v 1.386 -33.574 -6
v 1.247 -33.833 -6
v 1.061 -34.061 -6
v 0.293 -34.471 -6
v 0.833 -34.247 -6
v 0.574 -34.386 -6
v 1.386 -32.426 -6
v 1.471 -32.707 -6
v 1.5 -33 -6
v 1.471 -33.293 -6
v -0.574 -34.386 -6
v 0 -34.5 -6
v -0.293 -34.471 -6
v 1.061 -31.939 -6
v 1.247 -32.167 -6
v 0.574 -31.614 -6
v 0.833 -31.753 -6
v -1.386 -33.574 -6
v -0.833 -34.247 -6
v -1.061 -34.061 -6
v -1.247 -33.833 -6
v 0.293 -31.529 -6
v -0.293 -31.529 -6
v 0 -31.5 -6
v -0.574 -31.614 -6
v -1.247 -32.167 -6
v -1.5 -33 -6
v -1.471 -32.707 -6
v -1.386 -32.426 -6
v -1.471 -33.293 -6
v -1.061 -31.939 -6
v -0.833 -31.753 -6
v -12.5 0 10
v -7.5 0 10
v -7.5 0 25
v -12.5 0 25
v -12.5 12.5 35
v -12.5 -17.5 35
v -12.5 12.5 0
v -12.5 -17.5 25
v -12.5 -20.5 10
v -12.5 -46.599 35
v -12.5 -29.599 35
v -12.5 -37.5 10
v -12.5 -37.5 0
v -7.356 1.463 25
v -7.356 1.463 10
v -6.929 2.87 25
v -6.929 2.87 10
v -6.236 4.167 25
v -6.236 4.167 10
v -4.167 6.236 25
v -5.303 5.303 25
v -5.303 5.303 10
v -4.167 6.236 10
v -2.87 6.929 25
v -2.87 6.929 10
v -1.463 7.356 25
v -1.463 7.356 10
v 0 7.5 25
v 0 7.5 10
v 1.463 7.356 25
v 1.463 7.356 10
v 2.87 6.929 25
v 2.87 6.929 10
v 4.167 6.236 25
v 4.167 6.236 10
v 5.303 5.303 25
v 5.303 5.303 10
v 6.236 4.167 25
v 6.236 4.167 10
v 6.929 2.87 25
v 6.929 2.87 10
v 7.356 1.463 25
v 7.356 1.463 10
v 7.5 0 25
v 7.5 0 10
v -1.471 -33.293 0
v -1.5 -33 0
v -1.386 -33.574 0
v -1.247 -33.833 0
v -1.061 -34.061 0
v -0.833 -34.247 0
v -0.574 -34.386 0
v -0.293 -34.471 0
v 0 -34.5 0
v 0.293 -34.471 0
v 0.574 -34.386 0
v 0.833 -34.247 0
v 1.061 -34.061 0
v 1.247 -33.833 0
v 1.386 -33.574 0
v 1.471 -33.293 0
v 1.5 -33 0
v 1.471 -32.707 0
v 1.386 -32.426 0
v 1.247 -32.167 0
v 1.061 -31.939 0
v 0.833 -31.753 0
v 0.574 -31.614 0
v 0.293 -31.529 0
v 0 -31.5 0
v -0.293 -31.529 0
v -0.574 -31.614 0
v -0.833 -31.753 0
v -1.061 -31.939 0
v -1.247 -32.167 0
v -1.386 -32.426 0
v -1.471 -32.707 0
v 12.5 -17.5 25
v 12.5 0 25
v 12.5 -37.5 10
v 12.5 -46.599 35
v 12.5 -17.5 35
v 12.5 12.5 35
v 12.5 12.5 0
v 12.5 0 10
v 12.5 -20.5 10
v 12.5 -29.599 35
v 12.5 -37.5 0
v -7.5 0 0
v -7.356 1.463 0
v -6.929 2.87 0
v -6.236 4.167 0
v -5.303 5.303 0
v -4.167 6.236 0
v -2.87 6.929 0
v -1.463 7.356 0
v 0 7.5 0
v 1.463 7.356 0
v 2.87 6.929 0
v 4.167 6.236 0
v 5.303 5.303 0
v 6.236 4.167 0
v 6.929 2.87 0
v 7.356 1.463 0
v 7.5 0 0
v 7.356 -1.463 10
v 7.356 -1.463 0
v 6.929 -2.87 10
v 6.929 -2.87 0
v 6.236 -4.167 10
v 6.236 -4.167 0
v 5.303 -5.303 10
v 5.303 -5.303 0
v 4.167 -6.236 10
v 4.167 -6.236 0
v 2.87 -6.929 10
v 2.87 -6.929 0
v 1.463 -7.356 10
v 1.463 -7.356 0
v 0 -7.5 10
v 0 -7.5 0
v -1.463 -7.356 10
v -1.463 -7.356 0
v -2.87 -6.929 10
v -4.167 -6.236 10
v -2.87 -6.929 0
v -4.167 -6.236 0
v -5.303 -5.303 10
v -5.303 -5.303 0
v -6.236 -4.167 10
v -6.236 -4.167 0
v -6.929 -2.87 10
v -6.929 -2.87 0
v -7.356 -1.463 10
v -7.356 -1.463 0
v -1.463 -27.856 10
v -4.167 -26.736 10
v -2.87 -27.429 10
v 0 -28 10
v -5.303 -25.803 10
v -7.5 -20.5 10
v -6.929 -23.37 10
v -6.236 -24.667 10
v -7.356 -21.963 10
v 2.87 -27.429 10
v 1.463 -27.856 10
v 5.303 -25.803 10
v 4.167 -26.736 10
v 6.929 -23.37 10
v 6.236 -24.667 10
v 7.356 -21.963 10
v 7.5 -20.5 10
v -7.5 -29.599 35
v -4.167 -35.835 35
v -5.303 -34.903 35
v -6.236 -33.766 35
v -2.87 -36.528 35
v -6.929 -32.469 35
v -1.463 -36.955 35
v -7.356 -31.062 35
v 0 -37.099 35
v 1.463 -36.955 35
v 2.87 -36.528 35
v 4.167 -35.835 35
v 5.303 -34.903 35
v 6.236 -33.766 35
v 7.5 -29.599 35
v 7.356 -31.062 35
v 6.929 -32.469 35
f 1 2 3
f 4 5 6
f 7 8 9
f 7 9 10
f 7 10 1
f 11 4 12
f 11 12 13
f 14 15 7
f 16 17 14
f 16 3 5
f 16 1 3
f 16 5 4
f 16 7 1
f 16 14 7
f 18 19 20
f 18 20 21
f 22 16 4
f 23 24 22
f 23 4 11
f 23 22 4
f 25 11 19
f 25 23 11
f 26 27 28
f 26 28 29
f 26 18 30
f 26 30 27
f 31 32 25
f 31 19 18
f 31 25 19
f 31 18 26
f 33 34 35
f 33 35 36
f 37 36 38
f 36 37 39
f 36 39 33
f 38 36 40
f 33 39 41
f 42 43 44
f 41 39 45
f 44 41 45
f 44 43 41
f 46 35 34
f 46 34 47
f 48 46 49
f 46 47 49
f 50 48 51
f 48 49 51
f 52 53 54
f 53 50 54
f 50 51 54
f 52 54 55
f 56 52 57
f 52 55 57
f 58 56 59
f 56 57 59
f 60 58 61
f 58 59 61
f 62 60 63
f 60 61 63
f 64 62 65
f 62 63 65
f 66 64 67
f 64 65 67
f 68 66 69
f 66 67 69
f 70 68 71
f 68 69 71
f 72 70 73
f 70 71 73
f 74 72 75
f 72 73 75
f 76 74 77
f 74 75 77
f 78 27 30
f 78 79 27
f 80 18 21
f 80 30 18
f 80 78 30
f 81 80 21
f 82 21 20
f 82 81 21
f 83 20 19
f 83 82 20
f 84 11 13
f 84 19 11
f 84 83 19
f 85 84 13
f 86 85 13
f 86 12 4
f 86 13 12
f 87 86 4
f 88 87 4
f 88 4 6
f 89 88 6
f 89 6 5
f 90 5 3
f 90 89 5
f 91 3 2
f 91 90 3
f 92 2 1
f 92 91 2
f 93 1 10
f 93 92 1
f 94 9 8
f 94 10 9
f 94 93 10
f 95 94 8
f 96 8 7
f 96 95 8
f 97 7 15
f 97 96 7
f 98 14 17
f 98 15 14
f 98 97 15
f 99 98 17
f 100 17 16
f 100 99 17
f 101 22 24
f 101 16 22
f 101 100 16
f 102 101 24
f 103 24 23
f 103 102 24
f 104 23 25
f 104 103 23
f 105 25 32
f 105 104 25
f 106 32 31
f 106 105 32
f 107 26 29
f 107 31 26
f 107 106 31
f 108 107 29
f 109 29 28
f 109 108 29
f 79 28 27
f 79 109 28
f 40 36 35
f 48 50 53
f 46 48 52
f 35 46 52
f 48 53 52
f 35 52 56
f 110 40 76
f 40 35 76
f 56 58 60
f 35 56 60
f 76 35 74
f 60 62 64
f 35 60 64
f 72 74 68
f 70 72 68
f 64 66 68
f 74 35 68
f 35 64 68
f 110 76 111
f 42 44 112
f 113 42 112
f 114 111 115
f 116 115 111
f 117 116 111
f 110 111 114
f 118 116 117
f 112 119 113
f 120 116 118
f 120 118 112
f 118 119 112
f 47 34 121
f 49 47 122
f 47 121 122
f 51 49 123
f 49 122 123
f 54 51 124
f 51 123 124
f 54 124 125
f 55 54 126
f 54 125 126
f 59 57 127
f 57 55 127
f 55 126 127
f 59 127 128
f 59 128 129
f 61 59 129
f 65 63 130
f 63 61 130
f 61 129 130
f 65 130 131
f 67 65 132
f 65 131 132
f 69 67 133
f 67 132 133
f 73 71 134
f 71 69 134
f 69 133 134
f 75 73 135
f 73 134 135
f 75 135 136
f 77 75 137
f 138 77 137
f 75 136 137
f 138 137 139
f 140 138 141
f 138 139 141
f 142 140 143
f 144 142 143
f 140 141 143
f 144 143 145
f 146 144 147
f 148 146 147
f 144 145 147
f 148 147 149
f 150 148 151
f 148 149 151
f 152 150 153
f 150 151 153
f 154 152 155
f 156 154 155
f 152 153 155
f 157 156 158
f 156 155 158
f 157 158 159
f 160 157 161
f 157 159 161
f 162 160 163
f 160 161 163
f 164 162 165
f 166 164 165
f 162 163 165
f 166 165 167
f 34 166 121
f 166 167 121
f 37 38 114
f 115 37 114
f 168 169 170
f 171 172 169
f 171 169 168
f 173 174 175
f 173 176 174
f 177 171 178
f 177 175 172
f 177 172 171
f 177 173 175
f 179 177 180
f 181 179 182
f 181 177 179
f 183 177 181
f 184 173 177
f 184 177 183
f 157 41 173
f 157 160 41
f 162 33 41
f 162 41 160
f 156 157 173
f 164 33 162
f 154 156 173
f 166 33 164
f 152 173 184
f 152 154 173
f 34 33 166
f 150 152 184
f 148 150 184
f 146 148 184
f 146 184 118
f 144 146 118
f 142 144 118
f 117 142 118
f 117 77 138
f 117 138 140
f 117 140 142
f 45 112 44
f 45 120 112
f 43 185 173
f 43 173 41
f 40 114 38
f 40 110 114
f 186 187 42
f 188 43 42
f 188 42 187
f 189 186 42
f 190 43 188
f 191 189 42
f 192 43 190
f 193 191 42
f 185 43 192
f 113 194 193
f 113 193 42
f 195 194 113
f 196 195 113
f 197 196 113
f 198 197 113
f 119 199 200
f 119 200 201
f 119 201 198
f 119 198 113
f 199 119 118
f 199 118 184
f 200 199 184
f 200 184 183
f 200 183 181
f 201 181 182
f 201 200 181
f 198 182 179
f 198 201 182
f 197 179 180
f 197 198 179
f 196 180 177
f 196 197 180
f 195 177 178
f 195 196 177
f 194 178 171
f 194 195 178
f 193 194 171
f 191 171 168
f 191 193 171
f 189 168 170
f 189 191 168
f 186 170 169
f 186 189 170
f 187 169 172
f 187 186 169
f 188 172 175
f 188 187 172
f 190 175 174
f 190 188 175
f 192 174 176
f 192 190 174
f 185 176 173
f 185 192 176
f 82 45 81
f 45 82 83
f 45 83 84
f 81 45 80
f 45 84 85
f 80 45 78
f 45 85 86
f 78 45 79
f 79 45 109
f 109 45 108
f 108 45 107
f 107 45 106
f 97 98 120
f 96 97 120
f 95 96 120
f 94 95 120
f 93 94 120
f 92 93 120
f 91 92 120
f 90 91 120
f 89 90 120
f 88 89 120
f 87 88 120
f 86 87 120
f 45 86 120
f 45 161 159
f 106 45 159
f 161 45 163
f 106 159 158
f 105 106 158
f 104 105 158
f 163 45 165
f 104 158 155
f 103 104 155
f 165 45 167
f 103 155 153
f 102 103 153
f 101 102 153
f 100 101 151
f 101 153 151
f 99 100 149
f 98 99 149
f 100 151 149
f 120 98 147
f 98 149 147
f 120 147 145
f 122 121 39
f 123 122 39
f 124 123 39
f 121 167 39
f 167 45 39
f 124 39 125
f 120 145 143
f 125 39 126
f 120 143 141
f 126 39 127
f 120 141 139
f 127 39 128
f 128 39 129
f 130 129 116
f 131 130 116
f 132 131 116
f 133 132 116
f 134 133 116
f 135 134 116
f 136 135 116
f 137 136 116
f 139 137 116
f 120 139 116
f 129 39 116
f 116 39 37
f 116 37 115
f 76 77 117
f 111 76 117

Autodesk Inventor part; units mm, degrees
ref_plane "YZ Plane" through (0, 0, 0) normal (1, 0, 0) x (0, 1, 0)
ref_plane "XZ Plane" through (0, 0, 0) normal (0, 1, 0) x (-1, 0, 0)
sketch "Sketch1" plane through (0, 0, 0) normal (0, 0, 1) x (1, 0, 0)
  line L0 (-12.5, 12.5) -> (12.5, 12.5)
  line L1 (12.5, 12.5) -> (12.5, -37.5)
  line L2 (12.5, -37.5) -> (-12.5, -37.5)
  line L3 (-12.5, -37.5) -> (-12.5, 12.5)
  point P0 (0, 0)
  dimension "d0" = 25
  dimension "d1" = 50
  dimension "d2" = 12.5
  dimension "d3" = 12.5
extrude "Extrusion1" add sketch "Sketch1" along normal blind 10
sketch "Sketch2" plane through (0, 0, 0) normal (0, 0, -1) x (-1, 0, 0)
  circle A0 centre (0, -33) radius 1.5
  circle A1 centre (0, 0) radius 7.5
  dimension "d7" = 3
  dimension "d8" = 33
  dimension "d17" = 15
extrude "Extrusion2" add sketch "Sketch2" along normal blind 6 contours A0
sketch "Sketch3" plane through (0, 0, 10) normal (0, 0, 1) x (1, 0, 0)
  arc A0 (7.5, 0) -> (-7.5, 0) centre (0, 0) ccw
  line L0 (-7.5, 0) -> (-12.5, 0)
  line L1 (-12.5, 12.5) -> (-12.5, -37.5) projected
  line L2 (-12.5, 0) -> (-12.5, 12.5)
  line L3 (12.5, 12.5) -> (-12.5, 12.5) projected
  line L4 (12.5, 12.5) -> (12.5, 0)
  line L5 (12.5, -37.5) -> (12.5, 12.5) projected
  line L6 (7.5, 0) -> (12.5, 0)
  dimension "d11" = 15
extrude "Extrusion3" add sketch "Sketch3" along normal blind 15
sketch "Sketch4" plane through (0, 0, 25) normal (0, 0, 1) x (1, 0, 0)
  line L0 (-12.5, 12.5) -> (-12.5, 0) projected
  line L1 (-12.5, 12.5) -> (12.5, 12.5)
  line L2 (12.5, 12.5) -> (12.5, -17.5)
  line L3 (12.5, -17.5) -> (-12.5, -17.5)
  line L4 (-12.5, -17.5) -> (-12.5, 12.5)
  point P0 (0, 0)
  dimension "d14" = 25
  dimension "d21" = 30
extrude "Extrusion4" add sketch "Sketch4" along normal blind 10
sketch "Sketch5" plane through (0, 0, 0) normal (0, 0, -1) x (-1, 0, 0)
  circle A0 centre (0, 0) radius 7.5
  dimension "d18" = 15
extrude "Extrusion5" cut sketch "Sketch5" against normal blind 10
sketch "Sketch6" plane through (0, 0, 10) normal (0, 0, 1) x (1, 0, 0)
  line L0 (-12.5, -20.5) -> (-12.5, -37.5)
  line L1 (-12.5, -37.5) -> (12.5, -37.5) projected
  line L2 (-12.5, -37.5) -> (12.5, -37.5)
  line L3 (12.5, -37.5) -> (12.5, -20.5)
  line L4 (12.5, -37.5) -> (12.5, 0) projected
  arc A0 (-7.5, -20.5) -> (7.5, -20.5) centre (0, -20.5) ccw
  line L5 (-12.5, -20.5) -> (-7.5, -20.5)
  line L6 (7.5, -20.5) -> (12.5, -20.5)
  line L7 (-12.5, 0) -> (-12.5, -37.5) projected
  line L8 (-12.5, -29) -> (12.5, -29)
  point P0 (0, 0)
  dimension "d22" = 15
  dimension "d23" = 17
  dimension "d24" = 17
ref_plane "Work Plane1" through (0, -37.5, 0) normal (-1, 0, 0) x (0, 0, 1)
sketch "Sketch8" plane through (0, -37.5, 0) normal (-1, 0, 0) x (0, 0, 1)
  line L0 (10, 0) -> (10, 37.5) projected
  line L1 (10, 8.5) -> (35, -0.5993)
  line L2 (10, 8.5) -> (36.6044, 8.5) construction
  line L3 (0, 0) -> (10, 0) projected
  point P0 (0, 37.5)
  dimension "d26" = 20
  dimension "d27" = 8.5
  dimension "d32" = 25
sweep "Sweep1" add profiles "Sketch6" path "Sketch8" path curves L1
thread "Thread1"
equation "\"d2\" = 0.5 * d0"
equation "\"d24\" = d23"
properties part number "top_part"
